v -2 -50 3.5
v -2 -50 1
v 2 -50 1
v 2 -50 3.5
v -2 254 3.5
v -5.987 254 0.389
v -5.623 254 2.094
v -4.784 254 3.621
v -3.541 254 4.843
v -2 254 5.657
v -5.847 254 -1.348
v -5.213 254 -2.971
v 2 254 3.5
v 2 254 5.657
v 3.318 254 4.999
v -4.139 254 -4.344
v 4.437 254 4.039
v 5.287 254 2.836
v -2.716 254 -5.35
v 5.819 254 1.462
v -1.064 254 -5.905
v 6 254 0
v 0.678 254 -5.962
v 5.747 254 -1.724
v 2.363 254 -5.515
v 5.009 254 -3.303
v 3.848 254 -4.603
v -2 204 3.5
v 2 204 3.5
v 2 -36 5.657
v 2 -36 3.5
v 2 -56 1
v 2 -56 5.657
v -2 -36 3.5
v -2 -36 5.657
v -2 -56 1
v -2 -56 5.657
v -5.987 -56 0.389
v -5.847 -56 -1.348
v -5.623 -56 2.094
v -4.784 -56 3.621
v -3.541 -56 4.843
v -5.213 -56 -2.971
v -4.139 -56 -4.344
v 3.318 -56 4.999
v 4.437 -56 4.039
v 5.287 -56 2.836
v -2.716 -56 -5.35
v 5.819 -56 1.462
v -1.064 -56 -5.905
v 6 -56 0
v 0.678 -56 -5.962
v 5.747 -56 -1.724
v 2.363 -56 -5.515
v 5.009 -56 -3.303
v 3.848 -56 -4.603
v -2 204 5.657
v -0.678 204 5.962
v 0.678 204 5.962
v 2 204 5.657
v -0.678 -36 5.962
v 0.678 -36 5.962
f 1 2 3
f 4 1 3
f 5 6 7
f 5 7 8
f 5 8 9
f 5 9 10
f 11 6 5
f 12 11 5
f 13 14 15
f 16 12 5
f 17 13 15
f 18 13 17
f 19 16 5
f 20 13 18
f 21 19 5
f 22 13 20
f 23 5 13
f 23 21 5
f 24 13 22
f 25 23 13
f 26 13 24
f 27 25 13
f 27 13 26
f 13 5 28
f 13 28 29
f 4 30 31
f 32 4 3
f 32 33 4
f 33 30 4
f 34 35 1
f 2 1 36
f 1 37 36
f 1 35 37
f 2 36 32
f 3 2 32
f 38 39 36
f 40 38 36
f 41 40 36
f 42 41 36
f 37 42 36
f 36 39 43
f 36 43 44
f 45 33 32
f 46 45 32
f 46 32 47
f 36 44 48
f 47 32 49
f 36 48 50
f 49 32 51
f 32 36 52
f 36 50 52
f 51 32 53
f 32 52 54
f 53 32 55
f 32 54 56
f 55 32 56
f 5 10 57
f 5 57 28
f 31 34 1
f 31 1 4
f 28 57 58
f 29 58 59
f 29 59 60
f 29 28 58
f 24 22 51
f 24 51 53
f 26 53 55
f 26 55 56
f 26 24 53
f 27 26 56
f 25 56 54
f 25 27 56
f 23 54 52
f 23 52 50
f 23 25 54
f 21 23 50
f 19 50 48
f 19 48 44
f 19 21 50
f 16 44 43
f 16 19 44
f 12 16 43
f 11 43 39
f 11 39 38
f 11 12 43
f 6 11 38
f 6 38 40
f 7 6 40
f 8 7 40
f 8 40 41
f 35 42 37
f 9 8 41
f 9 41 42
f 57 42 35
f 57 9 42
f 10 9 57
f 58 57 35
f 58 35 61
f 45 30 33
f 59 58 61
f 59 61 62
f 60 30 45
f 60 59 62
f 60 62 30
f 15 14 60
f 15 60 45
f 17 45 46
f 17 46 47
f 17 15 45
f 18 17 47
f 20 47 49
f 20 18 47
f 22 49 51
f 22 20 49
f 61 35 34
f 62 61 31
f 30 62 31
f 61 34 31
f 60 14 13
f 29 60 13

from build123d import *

# Parameters (mm, degrees)
SKETCH1_R                = 6
BOSS_EXTRUDE1_DEPTH      = 254
BOSS_EXTRUDE1_DEPTH_BACK = 56
CUT_EXTRUDE3_START       = -56
SKETCH2_W                = 4
SKETCH2_H                = 5
CUT_EXTRUDE3_DEPTH       = 20
CUT_EXTRUDE3_DEPTH_BACK  = 0.0001
CUT_EXTRUDE4_START       = 254
SKETCH2_2_W              = 4
SKETCH2_2_H              = 5
CUT_EXTRUDE4_DEPTH       = 50
CUT_EXTRUDE6_START       = -56
SKETCH3_W                = 4
SKETCH3_H                = 10
CUT_EXTRUDE6_DEPTH       = 6


with BuildPart() as part:
    # Sketch1 → Boss-Extrude1 (new body, two sides)
    with BuildSketch(Plane(origin=(0, 0, 0), x_dir=(1, 0, 0), z_dir=(0, 1, 0))) as boss_extrude1_sk:
        Circle(SKETCH1_R)
    extrude(amount=BOSS_EXTRUDE1_DEPTH)
    extrude(boss_extrude1_sk.sketch, amount=-BOSS_EXTRUDE1_DEPTH_BACK)

    # Sketch2 → Cut-Extrude3 (cut, two sides)
    with BuildSketch(Plane(origin=(0, 0, 0), x_dir=(1, 0, 0), z_dir=(0, 1, 0)).offset(CUT_EXTRUDE3_START)) as cut_extrude3_sk:
        with Locations((0, -6)):
            Rectangle(SKETCH2_W, SKETCH2_H)
    extrude(amount=CUT_EXTRUDE3_DEPTH, mode=Mode.SUBTRACT)
    extrude(cut_extrude3_sk.sketch, amount=-CUT_EXTRUDE3_DEPTH_BACK, mode=Mode.SUBTRACT)

    # Sketch2<2> → Cut-Extrude4 (cut)
    with BuildSketch(Plane(origin=(0, 0, 0), x_dir=(1, 0, 0), z_dir=(0, 1, 0)).offset(CUT_EXTRUDE4_START)):
        with Locations((0, -6)):
            Rectangle(SKETCH2_2_W, SKETCH2_2_H)
    extrude(amount=-CUT_EXTRUDE4_DEPTH, mode=Mode.SUBTRACT)

    # Sketch3 → Cut-Extrude6 (cut)
    with BuildSketch(Plane(origin=(0, 0, 0), x_dir=(1, 0, 0), z_dir=(0, 1, 0)).offset(CUT_EXTRUDE6_START)):
        with Locations((0, -6)):
            Rectangle(SKETCH3_W, SKETCH3_H)
    extrude(amount=CUT_EXTRUDE6_DEPTH, mode=Mode.SUBTRACT)


solid = part.part
